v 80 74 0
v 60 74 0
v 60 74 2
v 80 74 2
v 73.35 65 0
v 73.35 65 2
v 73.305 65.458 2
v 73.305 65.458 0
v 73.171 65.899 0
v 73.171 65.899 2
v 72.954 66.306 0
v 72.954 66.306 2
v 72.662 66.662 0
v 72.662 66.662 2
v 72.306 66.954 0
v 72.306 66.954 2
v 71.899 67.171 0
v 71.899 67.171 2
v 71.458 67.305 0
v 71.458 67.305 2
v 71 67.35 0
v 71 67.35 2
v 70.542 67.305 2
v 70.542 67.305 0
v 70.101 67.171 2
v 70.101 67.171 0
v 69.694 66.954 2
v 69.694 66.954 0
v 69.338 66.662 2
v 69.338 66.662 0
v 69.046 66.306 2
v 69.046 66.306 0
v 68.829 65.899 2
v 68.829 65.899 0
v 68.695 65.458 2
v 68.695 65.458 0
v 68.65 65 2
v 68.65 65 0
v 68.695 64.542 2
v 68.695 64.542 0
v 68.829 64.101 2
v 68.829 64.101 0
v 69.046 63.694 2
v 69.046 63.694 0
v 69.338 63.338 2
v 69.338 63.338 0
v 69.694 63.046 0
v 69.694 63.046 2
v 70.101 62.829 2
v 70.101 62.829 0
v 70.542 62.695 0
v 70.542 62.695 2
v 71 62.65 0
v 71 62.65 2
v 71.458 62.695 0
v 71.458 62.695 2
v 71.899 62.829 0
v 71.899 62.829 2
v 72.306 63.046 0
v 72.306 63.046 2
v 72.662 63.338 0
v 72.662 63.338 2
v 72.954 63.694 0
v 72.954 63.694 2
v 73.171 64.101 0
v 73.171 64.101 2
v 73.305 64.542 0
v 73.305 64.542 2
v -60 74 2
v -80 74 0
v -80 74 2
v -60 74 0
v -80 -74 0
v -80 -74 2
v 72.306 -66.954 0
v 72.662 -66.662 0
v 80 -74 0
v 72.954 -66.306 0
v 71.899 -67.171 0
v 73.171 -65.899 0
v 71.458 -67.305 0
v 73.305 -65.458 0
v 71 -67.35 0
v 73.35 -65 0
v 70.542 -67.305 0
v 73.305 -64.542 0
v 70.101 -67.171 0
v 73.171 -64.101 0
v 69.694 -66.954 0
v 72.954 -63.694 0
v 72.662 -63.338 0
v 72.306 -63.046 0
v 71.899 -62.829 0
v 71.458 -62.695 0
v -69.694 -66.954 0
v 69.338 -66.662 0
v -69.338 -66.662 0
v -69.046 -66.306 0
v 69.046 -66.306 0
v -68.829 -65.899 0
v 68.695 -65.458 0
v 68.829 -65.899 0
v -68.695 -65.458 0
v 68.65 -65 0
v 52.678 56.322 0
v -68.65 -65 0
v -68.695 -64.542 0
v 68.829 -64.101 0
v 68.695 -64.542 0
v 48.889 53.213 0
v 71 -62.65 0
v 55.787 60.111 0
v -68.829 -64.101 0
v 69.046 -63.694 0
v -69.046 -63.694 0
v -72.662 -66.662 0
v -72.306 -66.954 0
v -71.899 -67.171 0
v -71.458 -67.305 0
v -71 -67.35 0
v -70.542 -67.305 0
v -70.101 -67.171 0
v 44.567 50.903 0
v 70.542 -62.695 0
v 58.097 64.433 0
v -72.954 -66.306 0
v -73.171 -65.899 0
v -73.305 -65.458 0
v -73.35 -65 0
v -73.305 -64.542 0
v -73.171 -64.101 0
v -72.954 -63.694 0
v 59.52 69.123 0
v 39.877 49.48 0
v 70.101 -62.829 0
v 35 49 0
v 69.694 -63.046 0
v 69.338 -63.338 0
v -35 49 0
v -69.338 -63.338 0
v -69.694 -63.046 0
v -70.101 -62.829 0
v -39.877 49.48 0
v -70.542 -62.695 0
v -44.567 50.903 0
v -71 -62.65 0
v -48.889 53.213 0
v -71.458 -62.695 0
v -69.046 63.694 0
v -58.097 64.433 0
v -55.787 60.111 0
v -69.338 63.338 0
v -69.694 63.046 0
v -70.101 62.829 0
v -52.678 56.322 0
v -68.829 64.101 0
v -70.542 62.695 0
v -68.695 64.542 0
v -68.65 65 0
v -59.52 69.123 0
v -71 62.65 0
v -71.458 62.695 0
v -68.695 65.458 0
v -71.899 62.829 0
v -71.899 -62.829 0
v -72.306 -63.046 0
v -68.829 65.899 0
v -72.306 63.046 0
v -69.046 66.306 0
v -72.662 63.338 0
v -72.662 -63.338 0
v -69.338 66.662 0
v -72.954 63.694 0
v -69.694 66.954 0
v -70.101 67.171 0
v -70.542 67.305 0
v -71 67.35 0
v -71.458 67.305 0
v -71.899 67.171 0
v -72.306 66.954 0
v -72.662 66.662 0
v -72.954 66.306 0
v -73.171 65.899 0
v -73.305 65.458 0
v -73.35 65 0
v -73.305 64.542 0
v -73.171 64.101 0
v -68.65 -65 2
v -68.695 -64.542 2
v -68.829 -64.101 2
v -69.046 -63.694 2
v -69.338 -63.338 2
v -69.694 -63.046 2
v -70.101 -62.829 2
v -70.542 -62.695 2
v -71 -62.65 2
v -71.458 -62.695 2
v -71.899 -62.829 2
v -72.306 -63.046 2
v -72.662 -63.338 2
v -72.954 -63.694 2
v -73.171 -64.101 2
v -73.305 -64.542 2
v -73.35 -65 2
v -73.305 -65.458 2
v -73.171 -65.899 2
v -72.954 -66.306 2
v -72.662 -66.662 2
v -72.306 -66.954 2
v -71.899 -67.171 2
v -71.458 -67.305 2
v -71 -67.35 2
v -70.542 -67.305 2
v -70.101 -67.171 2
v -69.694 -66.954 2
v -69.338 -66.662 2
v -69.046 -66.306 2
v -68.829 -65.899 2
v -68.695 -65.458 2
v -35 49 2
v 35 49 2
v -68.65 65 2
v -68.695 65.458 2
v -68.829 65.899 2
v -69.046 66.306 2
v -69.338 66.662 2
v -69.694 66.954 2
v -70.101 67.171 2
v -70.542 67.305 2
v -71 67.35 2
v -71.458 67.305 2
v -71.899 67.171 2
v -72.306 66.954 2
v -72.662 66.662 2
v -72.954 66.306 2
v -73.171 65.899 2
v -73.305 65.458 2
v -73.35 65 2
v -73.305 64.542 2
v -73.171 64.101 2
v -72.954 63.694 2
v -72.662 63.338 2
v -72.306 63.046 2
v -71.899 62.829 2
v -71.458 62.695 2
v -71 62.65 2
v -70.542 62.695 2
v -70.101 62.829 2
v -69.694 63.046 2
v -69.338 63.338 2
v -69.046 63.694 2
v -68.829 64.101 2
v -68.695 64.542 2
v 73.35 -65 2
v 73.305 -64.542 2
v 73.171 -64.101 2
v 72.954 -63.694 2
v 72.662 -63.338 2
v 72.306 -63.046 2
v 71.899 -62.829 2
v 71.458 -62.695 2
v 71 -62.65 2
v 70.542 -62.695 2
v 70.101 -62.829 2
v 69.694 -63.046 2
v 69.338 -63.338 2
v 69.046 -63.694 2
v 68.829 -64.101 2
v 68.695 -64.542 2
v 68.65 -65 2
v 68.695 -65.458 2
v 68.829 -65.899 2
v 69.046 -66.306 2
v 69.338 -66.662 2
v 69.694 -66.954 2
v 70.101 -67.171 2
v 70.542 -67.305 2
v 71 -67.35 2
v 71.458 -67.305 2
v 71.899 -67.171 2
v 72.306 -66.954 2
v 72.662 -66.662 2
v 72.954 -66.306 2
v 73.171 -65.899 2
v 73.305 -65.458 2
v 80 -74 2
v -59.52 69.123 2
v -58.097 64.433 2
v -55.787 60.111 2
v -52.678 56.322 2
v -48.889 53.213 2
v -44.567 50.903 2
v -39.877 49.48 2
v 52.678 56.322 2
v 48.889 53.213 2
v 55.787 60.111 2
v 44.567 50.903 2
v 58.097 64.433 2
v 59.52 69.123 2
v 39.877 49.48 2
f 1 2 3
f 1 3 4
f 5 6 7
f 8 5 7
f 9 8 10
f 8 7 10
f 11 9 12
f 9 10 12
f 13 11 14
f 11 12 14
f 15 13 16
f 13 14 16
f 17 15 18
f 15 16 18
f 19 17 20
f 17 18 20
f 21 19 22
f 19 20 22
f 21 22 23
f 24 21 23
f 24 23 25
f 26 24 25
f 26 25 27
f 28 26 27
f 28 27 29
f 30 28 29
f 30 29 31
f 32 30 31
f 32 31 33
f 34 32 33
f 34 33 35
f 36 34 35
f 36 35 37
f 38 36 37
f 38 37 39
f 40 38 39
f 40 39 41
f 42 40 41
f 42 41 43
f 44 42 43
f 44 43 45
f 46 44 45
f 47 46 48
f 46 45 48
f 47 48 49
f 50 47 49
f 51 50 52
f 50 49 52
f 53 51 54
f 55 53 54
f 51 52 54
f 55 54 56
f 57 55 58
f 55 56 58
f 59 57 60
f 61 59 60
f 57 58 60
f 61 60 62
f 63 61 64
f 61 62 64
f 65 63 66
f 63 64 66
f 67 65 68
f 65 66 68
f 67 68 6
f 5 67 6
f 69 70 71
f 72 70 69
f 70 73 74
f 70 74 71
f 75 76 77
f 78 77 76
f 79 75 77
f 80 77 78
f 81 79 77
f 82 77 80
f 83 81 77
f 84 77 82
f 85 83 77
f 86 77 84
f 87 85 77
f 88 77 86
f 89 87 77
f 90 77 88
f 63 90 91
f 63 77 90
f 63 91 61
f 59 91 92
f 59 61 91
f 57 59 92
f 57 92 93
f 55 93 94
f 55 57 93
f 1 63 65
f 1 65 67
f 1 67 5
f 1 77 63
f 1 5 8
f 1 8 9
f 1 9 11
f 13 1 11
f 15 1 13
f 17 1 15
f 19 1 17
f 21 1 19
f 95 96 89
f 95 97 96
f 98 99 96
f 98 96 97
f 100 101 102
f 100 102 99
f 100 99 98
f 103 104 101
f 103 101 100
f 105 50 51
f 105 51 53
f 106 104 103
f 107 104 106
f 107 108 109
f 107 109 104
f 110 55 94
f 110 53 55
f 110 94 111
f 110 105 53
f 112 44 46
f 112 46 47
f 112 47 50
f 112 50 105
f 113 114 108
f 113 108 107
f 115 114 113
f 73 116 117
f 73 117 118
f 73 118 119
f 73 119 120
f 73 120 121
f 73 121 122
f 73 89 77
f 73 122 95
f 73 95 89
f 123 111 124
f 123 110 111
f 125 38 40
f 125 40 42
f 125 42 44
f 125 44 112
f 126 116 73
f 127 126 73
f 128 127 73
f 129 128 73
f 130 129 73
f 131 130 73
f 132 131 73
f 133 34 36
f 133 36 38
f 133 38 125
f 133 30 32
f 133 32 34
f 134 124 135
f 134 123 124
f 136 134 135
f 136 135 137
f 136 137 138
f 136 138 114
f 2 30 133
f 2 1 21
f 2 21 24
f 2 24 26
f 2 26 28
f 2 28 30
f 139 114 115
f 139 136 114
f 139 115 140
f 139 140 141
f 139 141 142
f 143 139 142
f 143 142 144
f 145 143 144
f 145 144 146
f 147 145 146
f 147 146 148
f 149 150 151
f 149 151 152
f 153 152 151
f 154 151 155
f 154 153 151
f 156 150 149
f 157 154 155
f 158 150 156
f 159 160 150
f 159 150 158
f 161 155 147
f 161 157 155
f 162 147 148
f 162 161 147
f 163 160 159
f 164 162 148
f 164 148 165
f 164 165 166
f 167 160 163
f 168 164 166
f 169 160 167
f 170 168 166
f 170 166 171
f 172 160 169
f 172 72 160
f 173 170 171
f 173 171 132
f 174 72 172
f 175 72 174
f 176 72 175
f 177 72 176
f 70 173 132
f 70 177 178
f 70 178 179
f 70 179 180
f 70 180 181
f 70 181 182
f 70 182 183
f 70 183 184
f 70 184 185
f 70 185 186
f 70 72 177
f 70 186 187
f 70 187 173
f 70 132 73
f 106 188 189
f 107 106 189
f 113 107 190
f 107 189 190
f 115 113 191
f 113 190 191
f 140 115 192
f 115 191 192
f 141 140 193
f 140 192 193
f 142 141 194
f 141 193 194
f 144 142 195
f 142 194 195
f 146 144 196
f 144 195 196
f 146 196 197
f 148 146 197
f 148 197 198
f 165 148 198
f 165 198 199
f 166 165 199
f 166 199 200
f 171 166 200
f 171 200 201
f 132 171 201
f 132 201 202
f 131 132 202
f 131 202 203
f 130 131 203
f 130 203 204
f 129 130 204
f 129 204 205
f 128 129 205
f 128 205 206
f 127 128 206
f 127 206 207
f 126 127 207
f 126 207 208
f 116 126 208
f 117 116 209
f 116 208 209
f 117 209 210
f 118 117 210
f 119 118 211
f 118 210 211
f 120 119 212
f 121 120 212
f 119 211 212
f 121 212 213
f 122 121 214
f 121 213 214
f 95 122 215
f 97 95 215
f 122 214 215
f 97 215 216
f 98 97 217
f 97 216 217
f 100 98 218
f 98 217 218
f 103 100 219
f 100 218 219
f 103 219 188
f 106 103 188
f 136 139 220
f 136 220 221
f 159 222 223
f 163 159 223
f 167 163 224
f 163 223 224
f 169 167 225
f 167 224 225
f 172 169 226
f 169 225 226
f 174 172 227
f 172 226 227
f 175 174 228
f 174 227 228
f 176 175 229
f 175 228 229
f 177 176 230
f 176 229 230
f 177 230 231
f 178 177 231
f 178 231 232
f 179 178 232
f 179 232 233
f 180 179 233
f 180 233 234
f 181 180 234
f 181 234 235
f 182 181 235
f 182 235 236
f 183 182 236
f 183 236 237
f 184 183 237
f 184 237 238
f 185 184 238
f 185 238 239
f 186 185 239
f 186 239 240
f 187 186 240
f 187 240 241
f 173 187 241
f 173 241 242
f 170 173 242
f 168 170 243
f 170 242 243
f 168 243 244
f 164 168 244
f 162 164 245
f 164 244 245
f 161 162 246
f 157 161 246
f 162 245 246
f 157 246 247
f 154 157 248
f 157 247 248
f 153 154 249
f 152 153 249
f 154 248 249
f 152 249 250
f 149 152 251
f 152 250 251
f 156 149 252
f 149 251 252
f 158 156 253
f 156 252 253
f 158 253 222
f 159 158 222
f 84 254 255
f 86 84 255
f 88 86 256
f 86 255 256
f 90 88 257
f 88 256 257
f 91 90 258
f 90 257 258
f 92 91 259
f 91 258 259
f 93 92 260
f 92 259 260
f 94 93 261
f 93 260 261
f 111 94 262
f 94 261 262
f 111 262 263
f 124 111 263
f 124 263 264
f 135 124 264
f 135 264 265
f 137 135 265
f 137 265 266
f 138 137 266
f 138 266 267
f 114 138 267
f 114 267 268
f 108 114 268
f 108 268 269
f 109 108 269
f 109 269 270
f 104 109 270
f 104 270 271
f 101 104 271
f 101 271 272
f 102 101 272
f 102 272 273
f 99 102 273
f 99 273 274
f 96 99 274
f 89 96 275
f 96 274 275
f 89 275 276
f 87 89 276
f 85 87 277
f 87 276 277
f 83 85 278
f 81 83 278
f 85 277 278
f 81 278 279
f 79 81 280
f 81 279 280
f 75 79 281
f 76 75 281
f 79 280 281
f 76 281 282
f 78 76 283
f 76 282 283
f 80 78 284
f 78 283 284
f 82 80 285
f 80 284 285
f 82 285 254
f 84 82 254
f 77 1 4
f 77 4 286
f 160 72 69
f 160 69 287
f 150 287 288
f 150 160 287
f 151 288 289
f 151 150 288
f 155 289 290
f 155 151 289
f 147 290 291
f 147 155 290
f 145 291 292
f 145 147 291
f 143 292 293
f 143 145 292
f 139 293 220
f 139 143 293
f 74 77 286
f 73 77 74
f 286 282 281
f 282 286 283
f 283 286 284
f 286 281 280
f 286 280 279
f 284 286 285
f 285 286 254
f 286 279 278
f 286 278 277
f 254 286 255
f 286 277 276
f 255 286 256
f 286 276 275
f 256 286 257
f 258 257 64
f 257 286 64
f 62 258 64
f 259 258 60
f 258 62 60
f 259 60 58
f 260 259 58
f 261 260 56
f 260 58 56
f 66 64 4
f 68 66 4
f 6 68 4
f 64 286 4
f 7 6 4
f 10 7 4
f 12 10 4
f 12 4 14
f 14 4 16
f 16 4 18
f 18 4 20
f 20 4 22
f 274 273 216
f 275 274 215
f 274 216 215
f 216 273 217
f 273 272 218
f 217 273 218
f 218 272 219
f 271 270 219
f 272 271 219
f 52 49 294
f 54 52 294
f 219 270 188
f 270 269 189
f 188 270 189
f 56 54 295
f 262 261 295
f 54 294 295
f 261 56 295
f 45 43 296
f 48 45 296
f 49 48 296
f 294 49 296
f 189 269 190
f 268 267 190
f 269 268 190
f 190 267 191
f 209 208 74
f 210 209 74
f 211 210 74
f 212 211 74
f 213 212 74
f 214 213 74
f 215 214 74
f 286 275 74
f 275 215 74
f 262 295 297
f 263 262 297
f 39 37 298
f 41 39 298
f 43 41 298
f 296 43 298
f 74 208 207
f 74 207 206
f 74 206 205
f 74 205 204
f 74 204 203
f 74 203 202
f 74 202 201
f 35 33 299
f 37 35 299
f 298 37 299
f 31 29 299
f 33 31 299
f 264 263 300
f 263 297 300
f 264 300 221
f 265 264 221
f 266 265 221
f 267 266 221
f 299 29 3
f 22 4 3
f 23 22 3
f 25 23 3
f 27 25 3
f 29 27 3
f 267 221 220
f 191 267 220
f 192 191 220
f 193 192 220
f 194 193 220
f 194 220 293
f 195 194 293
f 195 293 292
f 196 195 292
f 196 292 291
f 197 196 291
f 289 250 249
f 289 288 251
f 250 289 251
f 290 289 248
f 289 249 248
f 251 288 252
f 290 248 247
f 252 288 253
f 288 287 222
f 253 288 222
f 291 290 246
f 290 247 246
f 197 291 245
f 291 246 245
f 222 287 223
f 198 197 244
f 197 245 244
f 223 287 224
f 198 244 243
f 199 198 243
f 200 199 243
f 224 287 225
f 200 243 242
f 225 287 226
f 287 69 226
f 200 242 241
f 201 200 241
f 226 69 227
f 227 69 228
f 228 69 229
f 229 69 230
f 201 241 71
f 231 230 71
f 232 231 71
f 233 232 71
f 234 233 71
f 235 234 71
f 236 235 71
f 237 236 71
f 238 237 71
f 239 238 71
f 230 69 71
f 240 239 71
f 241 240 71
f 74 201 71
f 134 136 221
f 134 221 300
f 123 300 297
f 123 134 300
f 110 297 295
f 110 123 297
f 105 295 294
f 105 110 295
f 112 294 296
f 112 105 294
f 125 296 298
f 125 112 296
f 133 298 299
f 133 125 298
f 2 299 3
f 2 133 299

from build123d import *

# Parameters (mm, degrees)
AUFSATZ_LINEAR_AUSTRAGEN1_DEPTH = 2
SKIZZE3_R                       = 2.35
SCHNITT_LINEAR_AUSTRAGEN1_DEPTH = 109.995412748


with BuildPart() as part:
    # Skizze1 → Aufsatz-Linear austragen1 (new body)
    with BuildSketch(Plane.XY):
        with BuildLine():
            Line((-35, 49), (35, 49))
            ThreePointArc((35, 49), (52.67766953, 56.32233047), (60, 74))
            Line((60, 74), (80, 74))
            Line((80, 74), (80, -74))
            Line((80, -74), (-80, -74))
            Line((-80, -74), (-80, 74))
            Line((-80, 74), (-60, 74))
            ThreePointArc((-60, 74), (-52.67766953, 56.32233047), (-35, 49))
        make_face()
    extrude(amount=AUFSATZ_LINEAR_AUSTRAGEN1_DEPTH)

    # Skizze3 → Schnitt-Linear austragen1 (cut, through all)
    with BuildSketch(Plane.XY.offset(2)):
        with Locations((71, 65)):
            Circle(SKIZZE3_R)
        with Locations((-71, -65)):
            Circle(SKIZZE3_R)
        with Locations((71, -65)):
            Circle(SKIZZE3_R)
        with Locations((-71, 65)):
            Circle(SKIZZE3_R)
    extrude(amount=-SCHNITT_LINEAR_AUSTRAGEN1_DEPTH, mode=Mode.SUBTRACT)


solid = part.part
